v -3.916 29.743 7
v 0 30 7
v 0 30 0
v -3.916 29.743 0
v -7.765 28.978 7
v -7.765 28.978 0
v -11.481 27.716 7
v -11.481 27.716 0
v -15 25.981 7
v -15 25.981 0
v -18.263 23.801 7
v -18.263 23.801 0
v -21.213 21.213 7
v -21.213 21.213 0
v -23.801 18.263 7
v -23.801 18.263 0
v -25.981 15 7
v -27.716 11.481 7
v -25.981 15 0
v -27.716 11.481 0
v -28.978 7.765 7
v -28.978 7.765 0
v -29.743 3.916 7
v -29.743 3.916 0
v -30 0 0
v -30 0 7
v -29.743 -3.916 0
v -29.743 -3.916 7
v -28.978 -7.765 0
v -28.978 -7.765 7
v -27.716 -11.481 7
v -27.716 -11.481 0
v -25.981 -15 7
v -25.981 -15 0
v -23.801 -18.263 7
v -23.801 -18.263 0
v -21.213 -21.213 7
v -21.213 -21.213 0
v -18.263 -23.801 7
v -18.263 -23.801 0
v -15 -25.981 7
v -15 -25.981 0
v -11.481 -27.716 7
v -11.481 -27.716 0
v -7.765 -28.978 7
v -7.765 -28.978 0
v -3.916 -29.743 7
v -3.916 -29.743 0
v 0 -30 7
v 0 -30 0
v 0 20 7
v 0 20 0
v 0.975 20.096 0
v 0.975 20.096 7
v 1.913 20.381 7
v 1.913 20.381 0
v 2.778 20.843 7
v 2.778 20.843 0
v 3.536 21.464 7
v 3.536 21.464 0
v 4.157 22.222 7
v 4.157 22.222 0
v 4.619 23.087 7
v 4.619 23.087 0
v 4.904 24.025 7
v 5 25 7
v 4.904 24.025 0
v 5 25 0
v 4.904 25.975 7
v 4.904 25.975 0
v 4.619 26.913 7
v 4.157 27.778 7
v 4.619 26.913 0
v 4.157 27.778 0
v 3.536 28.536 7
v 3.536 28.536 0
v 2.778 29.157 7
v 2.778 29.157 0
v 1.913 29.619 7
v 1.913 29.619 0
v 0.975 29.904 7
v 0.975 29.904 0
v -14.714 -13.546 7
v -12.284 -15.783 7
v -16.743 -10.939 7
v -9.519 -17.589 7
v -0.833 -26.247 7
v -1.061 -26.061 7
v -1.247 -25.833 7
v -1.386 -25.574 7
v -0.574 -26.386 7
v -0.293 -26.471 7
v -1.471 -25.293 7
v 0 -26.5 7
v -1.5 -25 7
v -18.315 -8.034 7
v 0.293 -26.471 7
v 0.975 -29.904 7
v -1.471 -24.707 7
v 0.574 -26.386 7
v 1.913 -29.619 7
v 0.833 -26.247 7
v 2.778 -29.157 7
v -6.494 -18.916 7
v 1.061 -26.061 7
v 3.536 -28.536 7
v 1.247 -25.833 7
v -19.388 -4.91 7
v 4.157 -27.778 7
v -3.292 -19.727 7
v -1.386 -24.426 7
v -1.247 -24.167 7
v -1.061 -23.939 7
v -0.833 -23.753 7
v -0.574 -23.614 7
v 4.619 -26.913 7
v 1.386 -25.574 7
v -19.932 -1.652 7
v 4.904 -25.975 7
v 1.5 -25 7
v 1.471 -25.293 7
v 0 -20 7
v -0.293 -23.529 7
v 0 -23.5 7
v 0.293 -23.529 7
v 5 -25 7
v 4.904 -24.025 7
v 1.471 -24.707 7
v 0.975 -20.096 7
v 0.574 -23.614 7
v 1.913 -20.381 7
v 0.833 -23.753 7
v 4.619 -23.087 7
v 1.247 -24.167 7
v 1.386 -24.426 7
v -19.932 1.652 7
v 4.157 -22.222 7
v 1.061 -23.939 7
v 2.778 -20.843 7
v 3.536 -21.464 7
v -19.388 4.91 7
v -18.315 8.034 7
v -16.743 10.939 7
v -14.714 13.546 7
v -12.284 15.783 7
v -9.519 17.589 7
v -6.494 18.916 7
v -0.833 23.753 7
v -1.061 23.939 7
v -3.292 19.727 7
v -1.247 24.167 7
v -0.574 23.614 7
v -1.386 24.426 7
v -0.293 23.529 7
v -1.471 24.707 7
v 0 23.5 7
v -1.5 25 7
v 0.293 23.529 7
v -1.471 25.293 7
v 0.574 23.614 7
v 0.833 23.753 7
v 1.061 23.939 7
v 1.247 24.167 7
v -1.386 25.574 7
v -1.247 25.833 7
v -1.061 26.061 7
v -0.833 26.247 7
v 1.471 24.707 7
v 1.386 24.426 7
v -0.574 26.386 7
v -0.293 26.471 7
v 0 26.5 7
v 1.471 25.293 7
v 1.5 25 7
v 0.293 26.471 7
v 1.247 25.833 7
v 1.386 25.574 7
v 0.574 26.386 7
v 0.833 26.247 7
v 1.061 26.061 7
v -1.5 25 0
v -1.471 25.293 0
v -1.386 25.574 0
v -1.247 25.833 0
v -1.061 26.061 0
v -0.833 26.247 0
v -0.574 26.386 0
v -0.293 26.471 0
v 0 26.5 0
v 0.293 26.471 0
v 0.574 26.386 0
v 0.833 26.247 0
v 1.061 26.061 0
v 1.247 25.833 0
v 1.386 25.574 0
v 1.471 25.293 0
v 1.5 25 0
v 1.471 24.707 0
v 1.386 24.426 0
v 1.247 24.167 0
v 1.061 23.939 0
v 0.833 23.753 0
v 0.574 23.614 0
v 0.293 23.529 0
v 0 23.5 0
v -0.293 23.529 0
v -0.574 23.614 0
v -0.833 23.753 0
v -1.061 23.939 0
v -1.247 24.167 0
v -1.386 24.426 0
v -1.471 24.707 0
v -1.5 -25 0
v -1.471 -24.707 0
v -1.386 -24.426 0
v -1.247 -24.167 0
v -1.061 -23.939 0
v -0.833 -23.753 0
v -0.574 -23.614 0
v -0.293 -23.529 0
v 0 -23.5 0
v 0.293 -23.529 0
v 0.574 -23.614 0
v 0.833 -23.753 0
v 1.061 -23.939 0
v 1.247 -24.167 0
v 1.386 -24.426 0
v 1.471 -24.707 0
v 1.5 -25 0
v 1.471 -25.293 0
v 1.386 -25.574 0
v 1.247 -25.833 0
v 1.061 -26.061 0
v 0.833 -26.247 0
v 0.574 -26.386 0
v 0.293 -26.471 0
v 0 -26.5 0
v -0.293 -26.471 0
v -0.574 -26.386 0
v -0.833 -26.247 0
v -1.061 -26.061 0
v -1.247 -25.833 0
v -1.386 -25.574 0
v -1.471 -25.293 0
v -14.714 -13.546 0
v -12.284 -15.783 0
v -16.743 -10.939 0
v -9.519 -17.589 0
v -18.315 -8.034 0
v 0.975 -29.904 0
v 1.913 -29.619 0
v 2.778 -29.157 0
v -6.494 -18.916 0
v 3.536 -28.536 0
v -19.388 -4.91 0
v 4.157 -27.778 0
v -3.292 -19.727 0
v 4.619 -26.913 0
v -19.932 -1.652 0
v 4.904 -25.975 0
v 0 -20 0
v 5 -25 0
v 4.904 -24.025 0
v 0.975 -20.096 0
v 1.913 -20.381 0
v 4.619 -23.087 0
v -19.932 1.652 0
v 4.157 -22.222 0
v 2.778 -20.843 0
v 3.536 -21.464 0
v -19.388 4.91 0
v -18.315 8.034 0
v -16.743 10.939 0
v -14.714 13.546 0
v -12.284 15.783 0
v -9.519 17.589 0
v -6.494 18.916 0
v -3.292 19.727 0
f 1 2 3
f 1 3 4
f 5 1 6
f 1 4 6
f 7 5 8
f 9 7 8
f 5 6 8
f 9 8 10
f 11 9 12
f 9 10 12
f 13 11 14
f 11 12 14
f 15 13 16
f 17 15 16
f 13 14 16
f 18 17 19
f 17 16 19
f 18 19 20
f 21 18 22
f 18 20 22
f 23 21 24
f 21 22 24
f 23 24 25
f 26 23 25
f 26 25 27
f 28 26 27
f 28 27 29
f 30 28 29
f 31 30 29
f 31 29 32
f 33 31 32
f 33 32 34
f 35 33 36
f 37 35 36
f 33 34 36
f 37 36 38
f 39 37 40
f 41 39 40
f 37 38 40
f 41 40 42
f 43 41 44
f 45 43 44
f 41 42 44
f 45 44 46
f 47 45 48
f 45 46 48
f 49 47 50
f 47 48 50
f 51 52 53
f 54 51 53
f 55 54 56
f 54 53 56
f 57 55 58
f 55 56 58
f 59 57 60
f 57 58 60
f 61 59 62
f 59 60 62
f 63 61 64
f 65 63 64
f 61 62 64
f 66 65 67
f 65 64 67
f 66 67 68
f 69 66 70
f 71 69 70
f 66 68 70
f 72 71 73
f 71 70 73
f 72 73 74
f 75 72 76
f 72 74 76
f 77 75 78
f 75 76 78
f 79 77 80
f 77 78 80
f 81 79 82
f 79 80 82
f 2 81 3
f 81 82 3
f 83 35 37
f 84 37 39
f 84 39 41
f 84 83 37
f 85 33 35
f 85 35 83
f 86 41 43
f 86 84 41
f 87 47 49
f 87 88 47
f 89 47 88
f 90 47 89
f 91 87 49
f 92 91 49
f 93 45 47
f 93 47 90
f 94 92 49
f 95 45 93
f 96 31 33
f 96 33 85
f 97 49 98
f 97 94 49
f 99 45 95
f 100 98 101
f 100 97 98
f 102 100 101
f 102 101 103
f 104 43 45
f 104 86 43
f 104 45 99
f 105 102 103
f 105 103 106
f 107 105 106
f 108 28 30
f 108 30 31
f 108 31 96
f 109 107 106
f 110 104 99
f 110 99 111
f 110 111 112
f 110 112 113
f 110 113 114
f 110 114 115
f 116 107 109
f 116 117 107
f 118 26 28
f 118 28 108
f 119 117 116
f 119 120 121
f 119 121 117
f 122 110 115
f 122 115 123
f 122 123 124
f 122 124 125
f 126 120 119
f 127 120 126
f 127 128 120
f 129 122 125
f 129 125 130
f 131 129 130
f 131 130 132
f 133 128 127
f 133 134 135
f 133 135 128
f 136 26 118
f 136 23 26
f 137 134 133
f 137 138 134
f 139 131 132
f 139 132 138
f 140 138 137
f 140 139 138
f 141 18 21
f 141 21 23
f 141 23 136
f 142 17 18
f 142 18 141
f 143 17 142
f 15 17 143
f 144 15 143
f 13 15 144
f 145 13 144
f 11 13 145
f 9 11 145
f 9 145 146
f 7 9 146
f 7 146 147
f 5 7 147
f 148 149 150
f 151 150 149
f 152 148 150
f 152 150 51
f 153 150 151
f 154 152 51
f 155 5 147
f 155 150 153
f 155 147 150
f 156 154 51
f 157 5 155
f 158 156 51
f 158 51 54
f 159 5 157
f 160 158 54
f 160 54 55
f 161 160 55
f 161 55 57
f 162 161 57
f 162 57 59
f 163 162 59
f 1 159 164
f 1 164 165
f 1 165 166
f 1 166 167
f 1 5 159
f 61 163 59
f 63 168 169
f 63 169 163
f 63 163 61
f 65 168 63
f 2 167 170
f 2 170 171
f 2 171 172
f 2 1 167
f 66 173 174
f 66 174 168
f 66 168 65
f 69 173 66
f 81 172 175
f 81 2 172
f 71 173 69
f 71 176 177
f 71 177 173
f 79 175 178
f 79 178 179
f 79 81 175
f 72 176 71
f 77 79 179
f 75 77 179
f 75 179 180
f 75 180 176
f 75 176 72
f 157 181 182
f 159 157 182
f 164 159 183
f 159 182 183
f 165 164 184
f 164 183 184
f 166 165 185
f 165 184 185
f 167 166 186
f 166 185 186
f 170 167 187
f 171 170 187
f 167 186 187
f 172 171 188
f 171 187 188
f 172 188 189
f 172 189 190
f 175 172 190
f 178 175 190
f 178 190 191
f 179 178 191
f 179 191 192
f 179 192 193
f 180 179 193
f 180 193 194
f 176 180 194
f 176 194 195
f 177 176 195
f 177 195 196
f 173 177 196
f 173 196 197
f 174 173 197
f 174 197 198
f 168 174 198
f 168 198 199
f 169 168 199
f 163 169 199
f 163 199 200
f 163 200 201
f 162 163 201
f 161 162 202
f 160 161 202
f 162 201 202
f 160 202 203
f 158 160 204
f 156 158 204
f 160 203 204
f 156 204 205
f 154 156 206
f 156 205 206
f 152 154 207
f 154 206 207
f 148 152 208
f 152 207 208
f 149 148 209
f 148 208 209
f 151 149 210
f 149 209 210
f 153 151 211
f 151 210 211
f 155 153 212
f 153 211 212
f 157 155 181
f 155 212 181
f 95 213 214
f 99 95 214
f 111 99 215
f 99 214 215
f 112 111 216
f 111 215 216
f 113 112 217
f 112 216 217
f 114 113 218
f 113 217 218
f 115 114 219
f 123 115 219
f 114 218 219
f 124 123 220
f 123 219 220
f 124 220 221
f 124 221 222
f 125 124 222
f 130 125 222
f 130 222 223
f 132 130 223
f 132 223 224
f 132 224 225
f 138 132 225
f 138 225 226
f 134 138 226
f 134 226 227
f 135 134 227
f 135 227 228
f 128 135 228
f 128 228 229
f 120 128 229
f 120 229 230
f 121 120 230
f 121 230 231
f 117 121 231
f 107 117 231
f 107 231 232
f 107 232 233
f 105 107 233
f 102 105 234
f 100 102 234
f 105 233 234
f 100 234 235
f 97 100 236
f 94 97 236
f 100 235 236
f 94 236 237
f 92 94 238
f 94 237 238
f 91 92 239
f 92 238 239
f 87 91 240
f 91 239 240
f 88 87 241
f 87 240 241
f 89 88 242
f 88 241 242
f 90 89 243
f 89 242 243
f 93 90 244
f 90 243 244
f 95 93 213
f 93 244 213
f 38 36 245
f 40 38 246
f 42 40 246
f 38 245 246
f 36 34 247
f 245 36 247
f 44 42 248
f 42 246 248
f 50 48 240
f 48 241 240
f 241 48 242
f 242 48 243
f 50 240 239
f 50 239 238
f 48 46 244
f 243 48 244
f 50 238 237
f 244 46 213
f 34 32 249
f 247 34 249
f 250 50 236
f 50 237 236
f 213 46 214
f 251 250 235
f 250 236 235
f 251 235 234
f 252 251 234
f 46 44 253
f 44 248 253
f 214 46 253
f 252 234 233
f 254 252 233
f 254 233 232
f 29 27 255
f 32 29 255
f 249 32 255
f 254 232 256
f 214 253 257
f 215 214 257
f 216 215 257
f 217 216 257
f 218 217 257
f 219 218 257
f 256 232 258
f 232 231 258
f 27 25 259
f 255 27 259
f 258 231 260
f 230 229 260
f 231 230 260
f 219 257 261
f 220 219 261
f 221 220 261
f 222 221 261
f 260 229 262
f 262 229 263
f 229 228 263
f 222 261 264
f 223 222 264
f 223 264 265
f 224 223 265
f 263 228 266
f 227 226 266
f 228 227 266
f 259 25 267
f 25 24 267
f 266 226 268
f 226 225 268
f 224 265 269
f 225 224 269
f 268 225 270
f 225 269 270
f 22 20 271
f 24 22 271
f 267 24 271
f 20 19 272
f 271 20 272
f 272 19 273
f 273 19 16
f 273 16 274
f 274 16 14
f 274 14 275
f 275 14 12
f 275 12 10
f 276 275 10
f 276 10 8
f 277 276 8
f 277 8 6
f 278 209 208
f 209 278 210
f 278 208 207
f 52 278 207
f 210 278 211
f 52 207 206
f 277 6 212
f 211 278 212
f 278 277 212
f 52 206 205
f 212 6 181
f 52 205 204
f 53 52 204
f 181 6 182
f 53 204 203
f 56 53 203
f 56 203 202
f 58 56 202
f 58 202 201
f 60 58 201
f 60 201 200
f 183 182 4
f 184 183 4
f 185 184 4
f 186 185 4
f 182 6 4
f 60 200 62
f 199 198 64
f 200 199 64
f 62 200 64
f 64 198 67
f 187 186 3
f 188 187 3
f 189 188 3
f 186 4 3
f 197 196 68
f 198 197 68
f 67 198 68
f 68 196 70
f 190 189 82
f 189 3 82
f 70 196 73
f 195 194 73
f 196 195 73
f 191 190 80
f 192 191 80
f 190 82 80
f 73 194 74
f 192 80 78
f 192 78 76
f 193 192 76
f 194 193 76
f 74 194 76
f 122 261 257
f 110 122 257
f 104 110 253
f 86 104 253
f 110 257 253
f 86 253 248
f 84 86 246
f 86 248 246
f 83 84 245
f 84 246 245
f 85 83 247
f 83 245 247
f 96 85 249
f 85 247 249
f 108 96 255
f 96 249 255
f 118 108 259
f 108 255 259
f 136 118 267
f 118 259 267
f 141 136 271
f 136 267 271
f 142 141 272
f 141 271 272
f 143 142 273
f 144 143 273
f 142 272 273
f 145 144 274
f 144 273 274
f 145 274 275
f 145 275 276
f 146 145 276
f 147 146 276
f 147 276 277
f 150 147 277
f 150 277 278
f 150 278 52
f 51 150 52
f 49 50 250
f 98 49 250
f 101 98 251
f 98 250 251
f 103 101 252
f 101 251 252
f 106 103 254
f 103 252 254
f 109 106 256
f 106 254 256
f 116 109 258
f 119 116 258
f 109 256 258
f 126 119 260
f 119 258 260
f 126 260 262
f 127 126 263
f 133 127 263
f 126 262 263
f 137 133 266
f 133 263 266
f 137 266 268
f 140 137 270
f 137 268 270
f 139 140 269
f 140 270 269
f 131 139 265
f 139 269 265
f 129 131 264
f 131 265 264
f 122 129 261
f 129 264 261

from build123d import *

# Parameters (mm, degrees)
BOSS_EXTRUDE1_DEPTH   = 7
F_3_0MM_DOWEL_HOLE1_D = 3


with BuildPart() as part:
    # Sketch1 → Boss-Extrude1 (new body)
    with BuildSketch(Plane.XY):
        with BuildLine():
            ThreePointArc((0, 30), (-30, 0), (0, -30))
            ThreePointArc((0, -30), (5, -25), (0, -20))
            ThreePointArc((0, -20), (-20, 0), (0, 20))
            ThreePointArc((0, 20), (5, 25), (0, 30))
        make_face()
    extrude(amount=BOSS_EXTRUDE1_DEPTH)

    # Ø3.0mm Dowel Hole1 (through all)
    with Locations(Plane.XY.offset(7)):
        with Locations((0, 25), (0, -25)):
            Hole(F_3_0MM_DOWEL_HOLE1_D / 2)


solid = part.part
